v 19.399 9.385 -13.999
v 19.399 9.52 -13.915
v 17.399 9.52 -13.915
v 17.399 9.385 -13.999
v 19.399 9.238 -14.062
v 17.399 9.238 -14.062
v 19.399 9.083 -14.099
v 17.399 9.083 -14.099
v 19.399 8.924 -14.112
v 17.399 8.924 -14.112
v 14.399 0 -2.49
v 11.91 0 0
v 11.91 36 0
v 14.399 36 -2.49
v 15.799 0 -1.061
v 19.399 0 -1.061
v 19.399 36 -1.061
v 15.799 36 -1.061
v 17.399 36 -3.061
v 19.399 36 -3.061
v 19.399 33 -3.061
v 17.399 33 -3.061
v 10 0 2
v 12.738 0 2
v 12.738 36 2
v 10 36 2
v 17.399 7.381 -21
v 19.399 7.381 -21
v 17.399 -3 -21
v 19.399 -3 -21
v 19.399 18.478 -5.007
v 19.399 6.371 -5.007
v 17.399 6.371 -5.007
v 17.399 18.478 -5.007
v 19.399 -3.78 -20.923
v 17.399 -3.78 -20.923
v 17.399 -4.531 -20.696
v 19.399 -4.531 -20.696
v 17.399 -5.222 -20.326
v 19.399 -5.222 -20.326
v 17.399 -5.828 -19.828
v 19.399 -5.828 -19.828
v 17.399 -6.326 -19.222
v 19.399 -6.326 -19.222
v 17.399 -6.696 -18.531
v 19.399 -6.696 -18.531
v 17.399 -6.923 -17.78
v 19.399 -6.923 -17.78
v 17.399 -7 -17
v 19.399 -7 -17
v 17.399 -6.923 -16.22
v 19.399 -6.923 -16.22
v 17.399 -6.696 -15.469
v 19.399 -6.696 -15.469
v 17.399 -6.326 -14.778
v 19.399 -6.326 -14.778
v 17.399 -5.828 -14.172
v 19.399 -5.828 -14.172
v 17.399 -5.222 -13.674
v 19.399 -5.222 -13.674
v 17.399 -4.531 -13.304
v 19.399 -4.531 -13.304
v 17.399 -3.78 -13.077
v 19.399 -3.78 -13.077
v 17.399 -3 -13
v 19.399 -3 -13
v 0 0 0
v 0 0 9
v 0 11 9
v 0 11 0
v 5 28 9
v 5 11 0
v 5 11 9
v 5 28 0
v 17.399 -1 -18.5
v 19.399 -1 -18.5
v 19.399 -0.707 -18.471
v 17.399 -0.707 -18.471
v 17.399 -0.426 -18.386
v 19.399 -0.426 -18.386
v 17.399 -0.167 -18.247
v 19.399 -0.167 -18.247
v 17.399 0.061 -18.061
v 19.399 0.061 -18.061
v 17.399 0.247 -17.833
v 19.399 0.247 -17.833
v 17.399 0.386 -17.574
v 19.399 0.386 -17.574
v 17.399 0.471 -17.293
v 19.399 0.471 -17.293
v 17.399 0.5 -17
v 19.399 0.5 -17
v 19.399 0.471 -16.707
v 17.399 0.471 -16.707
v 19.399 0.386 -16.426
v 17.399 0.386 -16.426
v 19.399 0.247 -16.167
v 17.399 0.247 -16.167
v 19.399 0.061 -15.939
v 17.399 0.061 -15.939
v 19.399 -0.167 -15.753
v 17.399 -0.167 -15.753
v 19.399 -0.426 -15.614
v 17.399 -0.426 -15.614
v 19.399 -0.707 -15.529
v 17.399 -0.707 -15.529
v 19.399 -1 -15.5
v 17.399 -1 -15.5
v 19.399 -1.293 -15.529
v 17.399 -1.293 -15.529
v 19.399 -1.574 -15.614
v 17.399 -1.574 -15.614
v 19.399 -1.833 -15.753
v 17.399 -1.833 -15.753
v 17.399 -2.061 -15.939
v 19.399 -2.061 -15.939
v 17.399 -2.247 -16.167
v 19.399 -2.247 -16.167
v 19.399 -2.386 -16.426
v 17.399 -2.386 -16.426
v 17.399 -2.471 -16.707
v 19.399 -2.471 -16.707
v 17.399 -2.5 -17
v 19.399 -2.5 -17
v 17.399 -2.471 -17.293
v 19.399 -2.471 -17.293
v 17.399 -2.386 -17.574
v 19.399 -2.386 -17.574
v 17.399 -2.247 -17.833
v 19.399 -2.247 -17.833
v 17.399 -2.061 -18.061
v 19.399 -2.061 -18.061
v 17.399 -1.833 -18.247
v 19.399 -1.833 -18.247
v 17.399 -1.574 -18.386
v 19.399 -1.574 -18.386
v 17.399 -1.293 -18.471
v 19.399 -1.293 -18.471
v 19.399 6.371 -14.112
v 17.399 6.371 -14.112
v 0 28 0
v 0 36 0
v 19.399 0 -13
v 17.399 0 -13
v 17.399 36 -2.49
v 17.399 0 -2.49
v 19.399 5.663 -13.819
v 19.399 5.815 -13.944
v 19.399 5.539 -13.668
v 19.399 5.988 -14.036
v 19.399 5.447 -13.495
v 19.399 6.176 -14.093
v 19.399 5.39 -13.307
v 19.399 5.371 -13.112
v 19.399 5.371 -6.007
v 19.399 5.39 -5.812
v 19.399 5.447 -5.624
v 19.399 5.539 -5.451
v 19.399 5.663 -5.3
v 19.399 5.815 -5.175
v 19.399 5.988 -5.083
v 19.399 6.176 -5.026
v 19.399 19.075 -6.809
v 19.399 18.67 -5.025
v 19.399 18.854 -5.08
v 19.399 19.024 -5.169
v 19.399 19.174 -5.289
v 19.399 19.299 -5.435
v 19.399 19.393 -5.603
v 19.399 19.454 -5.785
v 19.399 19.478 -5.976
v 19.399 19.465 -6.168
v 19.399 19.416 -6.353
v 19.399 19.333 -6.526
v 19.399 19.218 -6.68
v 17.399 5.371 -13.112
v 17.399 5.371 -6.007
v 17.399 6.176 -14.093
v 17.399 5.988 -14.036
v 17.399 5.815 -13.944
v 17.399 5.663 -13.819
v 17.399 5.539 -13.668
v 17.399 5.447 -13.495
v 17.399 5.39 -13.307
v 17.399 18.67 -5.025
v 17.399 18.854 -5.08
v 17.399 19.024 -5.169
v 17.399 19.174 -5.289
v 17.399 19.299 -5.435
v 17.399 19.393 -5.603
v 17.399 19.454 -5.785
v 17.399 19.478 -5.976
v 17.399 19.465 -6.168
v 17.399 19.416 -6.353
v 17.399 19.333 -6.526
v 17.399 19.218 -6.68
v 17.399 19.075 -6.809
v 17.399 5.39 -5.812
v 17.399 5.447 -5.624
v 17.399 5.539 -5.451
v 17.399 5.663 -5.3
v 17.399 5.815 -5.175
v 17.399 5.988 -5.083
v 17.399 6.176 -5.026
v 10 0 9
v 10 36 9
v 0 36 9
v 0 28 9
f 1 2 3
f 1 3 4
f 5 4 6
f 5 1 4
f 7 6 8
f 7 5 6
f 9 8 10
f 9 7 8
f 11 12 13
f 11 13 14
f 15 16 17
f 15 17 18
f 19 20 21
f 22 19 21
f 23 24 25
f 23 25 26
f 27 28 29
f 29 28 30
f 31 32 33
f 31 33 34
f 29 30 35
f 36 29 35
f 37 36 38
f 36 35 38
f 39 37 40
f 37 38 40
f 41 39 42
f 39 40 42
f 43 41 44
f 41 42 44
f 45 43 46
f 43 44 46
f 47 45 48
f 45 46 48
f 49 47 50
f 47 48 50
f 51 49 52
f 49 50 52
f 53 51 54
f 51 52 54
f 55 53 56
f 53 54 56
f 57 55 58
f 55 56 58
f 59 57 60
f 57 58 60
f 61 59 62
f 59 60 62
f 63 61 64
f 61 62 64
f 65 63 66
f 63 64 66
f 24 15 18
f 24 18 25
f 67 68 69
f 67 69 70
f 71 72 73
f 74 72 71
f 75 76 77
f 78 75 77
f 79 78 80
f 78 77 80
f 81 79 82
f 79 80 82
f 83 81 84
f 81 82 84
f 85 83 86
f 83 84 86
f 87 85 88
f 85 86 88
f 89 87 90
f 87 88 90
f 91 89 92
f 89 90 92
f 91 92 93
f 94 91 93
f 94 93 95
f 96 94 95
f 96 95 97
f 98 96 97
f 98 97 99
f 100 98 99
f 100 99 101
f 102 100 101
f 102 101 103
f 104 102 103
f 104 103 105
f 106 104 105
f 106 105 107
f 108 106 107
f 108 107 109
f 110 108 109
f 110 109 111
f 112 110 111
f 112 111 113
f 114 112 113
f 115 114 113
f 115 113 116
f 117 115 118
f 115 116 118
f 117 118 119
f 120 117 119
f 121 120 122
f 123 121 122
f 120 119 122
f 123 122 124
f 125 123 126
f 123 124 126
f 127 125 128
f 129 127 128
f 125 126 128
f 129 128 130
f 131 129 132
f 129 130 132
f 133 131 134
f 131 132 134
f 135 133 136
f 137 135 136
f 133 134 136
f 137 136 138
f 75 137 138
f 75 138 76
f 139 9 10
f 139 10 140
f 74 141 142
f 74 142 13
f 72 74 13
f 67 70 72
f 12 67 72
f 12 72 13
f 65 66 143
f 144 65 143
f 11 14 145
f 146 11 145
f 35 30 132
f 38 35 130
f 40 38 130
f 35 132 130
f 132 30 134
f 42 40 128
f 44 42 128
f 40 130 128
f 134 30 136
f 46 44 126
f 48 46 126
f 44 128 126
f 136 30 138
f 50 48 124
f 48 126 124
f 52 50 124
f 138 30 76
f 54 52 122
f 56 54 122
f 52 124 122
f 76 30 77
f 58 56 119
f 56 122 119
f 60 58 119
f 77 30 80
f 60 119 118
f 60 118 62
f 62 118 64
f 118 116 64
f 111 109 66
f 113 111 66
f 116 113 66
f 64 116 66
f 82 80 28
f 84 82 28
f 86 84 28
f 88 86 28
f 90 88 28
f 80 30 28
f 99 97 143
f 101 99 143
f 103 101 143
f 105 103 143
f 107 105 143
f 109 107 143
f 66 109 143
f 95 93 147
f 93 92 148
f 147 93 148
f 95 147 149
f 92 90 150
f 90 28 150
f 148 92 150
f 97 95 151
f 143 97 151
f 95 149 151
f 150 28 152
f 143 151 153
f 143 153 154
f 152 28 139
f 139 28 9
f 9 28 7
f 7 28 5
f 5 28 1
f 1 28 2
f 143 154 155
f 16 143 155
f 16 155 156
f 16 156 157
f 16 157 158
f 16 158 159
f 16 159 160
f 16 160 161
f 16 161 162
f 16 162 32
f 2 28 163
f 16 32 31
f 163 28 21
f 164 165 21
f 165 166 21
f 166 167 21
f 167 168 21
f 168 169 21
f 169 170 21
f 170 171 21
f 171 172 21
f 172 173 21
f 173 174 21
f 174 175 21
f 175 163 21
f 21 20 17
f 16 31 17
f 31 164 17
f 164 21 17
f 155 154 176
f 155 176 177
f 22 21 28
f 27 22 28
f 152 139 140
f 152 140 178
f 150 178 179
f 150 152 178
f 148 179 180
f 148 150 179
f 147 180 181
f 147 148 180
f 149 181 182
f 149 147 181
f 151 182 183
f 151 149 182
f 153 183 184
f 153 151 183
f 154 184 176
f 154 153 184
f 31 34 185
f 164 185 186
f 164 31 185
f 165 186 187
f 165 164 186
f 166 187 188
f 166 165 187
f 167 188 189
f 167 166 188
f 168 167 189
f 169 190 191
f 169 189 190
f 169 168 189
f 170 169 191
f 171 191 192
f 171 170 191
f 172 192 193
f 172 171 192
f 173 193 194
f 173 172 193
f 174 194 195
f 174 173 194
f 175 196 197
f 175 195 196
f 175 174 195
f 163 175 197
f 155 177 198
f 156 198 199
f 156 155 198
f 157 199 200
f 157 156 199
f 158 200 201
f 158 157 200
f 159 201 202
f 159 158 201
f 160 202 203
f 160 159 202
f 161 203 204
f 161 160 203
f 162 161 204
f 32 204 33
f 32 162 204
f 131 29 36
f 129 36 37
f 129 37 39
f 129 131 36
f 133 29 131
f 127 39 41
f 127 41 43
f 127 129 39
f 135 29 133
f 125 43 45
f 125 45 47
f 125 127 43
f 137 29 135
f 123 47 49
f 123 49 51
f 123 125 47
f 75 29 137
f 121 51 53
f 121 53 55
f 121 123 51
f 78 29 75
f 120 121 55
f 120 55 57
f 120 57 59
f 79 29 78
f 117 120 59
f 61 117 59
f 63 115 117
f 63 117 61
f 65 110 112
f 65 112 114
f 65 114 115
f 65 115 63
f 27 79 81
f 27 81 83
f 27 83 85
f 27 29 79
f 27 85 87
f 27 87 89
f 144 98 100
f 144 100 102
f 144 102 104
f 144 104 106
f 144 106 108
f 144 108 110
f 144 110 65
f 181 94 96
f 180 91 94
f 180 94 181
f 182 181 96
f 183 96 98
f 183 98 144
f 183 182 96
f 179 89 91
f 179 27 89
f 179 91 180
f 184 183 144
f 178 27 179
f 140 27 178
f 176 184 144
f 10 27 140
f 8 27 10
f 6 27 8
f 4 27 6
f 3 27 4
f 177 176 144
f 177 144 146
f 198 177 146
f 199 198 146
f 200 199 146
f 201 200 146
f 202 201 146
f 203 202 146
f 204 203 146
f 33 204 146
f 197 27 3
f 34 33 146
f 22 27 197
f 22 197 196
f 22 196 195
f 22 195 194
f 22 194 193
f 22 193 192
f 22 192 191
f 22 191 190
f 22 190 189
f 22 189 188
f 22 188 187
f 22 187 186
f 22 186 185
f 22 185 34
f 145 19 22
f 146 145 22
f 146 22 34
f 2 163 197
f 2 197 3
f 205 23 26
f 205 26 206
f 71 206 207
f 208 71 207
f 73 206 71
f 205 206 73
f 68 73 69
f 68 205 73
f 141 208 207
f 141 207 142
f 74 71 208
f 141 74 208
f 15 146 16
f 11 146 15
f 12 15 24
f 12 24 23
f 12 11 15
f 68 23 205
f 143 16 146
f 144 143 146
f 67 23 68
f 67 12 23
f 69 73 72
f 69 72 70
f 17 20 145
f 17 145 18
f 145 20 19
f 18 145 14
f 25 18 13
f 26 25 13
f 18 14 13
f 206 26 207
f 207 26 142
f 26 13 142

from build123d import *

# Parameters (mm, degrees)
BOSS_EXTRUDE1_DEPTH = 36
CUT_EXTRUDE1_REACH  = 21.399
CUT_EXTRUDE2_REACH  = 21.399
BOSS_EXTRUDE2_DEPTH = 2
CUT_EXTRUDE3_REACH  = 11
SKETCH5_W           = 5
SKETCH5_H           = 17
CUT_EXTRUDE4_REACH  = 21.399
SKETCH6_R           = 1.5


with BuildPart() as part:
    # Sketch1 → Boss-Extrude1 (new body)
    with BuildSketch(Plane(origin=(0, 0, 0), x_dir=(1, 0, 0), z_dir=(0, 1, 0))):
        Polygon((0, 0), (11.909668113, 0), (14.399319728, 2.489651615), (17.399319728, 2.489651615), (17.399319728, 21), (19.399319728, 21), (19.399319728, 1.06122449), (15.799319728, 1.06122449), (12.738095238, -2), (10, -2), (10, -9), (0, -9), align=None)
    extrude(amount=BOSS_EXTRUDE1_DEPTH)

    # Sketch2 → Cut-Extrude1 (cut, up to next)
    with BuildSketch(Plane(origin=(19.399319728, 0, 0), x_dir=(0, 0, -1), z_dir=(1, 0, 0)), mode=Mode.PRIVATE) as cut_extrude1_sk1:
        Polygon((3.06122449, 36), (3.06122449, 33), (21, 7.380773512), (21, 36), align=None)
    cut_extrude1_tool1 = extrude(cut_extrude1_sk1.sketch, amount=-CUT_EXTRUDE1_REACH, mode=Mode.PRIVATE) & part.part
    add(cut_extrude1_tool1.solids().sort_by_distance((19.39932, 26.365379, -14.453071))[0], mode=Mode.SUBTRACT)

    # Sketch3 → Cut-Extrude2 (cut, up to next)
    with BuildSketch(Plane(origin=(19.399319728, 0, 0), x_dir=(0, 0, -1), z_dir=(1, 0, 0)), mode=Mode.PRIVATE) as cut_extrude2_sk1:
        with BuildLine():
            Line((6.80922077, 19.075125289), (13.914682933, 9.520466295))
            ThreePointArc((13.914682933, 9.520466295), (14.061573755, 9.238022803), (14.112249375, 8.923724822))
            Line((14.112249375, 8.923724822), (14.112249375, 6.370604423))
            ThreePointArc((14.112249375, 6.370604423), (13.819356156, 5.663497642), (13.112249375, 5.370604423))
            Line((13.112249375, 5.370604423), (6.006787212, 5.370604423))
            ThreePointArc((6.006787212, 5.370604423), (5.299680431, 5.663497642), (5.006787212, 6.370604423))
            Line((5.006787212, 6.370604423), (5.006787212, 18.478383816))
            ThreePointArc((5.006787212, 18.478383816), (5.692489231, 19.427708197), (6.80922077, 19.075125289))
        make_face()
    cut_extrude2_tool1 = extrude(cut_extrude2_sk1.sketch, amount=-CUT_EXTRUDE2_REACH, mode=Mode.PRIVATE) & part.part
    add(cut_extrude2_tool1.solids().sort_by_distance((19.39932, 10.844583, -8.68829))[0], mode=Mode.SUBTRACT)

    # Sketch4 → Boss-Extrude2 (add)
    with BuildSketch(Plane(origin=(19.399319728, 0, 0), x_dir=(0, 0, -1), z_dir=(1, 0, 0))):
        with BuildLine():
            Line((21, 0), (21, -3))
            ThreePointArc((21, -3), (17, -7), (13, -3))
            Line((13, -3), (13, 0))
            Line((13, 0), (21, 0))
        make_face()
    extrude(amount=-BOSS_EXTRUDE2_DEPTH)

    # Sketch5 → Cut-Extrude3 (cut, up to next)
    with BuildSketch(Plane(origin=(0, 0, 0), x_dir=(-1, 0, 0), z_dir=(0, 0, -1)), mode=Mode.PRIVATE) as cut_extrude3_sk1:
        with Locations((-2.5, 19.5)):
            Rectangle(SKETCH5_W, SKETCH5_H)
    cut_extrude3_tool1 = extrude(cut_extrude3_sk1.sketch, amount=-CUT_EXTRUDE3_REACH, mode=Mode.PRIVATE) & part.part
    add(cut_extrude3_tool1.solids().sort_by_distance((2.5, 19.5, 0))[0], mode=Mode.SUBTRACT)

    # Sketch6 → Cut-Extrude4 (cut, up to next)
    with BuildSketch(Plane(origin=(19.399319728, 0, 0), x_dir=(0, 0, -1), z_dir=(1, 0, 0)), mode=Mode.PRIVATE) as cut_extrude4_sk1:
        with Locations((17, -1)):
            Circle(SKETCH6_R)
    cut_extrude4_tool1 = extrude(cut_extrude4_sk1.sketch, amount=-CUT_EXTRUDE4_REACH, mode=Mode.PRIVATE) & part.part
    add(cut_extrude4_tool1.solids().sort_by_distance((19.39932, -1, -17))[0], mode=Mode.SUBTRACT)


solid = part.part
